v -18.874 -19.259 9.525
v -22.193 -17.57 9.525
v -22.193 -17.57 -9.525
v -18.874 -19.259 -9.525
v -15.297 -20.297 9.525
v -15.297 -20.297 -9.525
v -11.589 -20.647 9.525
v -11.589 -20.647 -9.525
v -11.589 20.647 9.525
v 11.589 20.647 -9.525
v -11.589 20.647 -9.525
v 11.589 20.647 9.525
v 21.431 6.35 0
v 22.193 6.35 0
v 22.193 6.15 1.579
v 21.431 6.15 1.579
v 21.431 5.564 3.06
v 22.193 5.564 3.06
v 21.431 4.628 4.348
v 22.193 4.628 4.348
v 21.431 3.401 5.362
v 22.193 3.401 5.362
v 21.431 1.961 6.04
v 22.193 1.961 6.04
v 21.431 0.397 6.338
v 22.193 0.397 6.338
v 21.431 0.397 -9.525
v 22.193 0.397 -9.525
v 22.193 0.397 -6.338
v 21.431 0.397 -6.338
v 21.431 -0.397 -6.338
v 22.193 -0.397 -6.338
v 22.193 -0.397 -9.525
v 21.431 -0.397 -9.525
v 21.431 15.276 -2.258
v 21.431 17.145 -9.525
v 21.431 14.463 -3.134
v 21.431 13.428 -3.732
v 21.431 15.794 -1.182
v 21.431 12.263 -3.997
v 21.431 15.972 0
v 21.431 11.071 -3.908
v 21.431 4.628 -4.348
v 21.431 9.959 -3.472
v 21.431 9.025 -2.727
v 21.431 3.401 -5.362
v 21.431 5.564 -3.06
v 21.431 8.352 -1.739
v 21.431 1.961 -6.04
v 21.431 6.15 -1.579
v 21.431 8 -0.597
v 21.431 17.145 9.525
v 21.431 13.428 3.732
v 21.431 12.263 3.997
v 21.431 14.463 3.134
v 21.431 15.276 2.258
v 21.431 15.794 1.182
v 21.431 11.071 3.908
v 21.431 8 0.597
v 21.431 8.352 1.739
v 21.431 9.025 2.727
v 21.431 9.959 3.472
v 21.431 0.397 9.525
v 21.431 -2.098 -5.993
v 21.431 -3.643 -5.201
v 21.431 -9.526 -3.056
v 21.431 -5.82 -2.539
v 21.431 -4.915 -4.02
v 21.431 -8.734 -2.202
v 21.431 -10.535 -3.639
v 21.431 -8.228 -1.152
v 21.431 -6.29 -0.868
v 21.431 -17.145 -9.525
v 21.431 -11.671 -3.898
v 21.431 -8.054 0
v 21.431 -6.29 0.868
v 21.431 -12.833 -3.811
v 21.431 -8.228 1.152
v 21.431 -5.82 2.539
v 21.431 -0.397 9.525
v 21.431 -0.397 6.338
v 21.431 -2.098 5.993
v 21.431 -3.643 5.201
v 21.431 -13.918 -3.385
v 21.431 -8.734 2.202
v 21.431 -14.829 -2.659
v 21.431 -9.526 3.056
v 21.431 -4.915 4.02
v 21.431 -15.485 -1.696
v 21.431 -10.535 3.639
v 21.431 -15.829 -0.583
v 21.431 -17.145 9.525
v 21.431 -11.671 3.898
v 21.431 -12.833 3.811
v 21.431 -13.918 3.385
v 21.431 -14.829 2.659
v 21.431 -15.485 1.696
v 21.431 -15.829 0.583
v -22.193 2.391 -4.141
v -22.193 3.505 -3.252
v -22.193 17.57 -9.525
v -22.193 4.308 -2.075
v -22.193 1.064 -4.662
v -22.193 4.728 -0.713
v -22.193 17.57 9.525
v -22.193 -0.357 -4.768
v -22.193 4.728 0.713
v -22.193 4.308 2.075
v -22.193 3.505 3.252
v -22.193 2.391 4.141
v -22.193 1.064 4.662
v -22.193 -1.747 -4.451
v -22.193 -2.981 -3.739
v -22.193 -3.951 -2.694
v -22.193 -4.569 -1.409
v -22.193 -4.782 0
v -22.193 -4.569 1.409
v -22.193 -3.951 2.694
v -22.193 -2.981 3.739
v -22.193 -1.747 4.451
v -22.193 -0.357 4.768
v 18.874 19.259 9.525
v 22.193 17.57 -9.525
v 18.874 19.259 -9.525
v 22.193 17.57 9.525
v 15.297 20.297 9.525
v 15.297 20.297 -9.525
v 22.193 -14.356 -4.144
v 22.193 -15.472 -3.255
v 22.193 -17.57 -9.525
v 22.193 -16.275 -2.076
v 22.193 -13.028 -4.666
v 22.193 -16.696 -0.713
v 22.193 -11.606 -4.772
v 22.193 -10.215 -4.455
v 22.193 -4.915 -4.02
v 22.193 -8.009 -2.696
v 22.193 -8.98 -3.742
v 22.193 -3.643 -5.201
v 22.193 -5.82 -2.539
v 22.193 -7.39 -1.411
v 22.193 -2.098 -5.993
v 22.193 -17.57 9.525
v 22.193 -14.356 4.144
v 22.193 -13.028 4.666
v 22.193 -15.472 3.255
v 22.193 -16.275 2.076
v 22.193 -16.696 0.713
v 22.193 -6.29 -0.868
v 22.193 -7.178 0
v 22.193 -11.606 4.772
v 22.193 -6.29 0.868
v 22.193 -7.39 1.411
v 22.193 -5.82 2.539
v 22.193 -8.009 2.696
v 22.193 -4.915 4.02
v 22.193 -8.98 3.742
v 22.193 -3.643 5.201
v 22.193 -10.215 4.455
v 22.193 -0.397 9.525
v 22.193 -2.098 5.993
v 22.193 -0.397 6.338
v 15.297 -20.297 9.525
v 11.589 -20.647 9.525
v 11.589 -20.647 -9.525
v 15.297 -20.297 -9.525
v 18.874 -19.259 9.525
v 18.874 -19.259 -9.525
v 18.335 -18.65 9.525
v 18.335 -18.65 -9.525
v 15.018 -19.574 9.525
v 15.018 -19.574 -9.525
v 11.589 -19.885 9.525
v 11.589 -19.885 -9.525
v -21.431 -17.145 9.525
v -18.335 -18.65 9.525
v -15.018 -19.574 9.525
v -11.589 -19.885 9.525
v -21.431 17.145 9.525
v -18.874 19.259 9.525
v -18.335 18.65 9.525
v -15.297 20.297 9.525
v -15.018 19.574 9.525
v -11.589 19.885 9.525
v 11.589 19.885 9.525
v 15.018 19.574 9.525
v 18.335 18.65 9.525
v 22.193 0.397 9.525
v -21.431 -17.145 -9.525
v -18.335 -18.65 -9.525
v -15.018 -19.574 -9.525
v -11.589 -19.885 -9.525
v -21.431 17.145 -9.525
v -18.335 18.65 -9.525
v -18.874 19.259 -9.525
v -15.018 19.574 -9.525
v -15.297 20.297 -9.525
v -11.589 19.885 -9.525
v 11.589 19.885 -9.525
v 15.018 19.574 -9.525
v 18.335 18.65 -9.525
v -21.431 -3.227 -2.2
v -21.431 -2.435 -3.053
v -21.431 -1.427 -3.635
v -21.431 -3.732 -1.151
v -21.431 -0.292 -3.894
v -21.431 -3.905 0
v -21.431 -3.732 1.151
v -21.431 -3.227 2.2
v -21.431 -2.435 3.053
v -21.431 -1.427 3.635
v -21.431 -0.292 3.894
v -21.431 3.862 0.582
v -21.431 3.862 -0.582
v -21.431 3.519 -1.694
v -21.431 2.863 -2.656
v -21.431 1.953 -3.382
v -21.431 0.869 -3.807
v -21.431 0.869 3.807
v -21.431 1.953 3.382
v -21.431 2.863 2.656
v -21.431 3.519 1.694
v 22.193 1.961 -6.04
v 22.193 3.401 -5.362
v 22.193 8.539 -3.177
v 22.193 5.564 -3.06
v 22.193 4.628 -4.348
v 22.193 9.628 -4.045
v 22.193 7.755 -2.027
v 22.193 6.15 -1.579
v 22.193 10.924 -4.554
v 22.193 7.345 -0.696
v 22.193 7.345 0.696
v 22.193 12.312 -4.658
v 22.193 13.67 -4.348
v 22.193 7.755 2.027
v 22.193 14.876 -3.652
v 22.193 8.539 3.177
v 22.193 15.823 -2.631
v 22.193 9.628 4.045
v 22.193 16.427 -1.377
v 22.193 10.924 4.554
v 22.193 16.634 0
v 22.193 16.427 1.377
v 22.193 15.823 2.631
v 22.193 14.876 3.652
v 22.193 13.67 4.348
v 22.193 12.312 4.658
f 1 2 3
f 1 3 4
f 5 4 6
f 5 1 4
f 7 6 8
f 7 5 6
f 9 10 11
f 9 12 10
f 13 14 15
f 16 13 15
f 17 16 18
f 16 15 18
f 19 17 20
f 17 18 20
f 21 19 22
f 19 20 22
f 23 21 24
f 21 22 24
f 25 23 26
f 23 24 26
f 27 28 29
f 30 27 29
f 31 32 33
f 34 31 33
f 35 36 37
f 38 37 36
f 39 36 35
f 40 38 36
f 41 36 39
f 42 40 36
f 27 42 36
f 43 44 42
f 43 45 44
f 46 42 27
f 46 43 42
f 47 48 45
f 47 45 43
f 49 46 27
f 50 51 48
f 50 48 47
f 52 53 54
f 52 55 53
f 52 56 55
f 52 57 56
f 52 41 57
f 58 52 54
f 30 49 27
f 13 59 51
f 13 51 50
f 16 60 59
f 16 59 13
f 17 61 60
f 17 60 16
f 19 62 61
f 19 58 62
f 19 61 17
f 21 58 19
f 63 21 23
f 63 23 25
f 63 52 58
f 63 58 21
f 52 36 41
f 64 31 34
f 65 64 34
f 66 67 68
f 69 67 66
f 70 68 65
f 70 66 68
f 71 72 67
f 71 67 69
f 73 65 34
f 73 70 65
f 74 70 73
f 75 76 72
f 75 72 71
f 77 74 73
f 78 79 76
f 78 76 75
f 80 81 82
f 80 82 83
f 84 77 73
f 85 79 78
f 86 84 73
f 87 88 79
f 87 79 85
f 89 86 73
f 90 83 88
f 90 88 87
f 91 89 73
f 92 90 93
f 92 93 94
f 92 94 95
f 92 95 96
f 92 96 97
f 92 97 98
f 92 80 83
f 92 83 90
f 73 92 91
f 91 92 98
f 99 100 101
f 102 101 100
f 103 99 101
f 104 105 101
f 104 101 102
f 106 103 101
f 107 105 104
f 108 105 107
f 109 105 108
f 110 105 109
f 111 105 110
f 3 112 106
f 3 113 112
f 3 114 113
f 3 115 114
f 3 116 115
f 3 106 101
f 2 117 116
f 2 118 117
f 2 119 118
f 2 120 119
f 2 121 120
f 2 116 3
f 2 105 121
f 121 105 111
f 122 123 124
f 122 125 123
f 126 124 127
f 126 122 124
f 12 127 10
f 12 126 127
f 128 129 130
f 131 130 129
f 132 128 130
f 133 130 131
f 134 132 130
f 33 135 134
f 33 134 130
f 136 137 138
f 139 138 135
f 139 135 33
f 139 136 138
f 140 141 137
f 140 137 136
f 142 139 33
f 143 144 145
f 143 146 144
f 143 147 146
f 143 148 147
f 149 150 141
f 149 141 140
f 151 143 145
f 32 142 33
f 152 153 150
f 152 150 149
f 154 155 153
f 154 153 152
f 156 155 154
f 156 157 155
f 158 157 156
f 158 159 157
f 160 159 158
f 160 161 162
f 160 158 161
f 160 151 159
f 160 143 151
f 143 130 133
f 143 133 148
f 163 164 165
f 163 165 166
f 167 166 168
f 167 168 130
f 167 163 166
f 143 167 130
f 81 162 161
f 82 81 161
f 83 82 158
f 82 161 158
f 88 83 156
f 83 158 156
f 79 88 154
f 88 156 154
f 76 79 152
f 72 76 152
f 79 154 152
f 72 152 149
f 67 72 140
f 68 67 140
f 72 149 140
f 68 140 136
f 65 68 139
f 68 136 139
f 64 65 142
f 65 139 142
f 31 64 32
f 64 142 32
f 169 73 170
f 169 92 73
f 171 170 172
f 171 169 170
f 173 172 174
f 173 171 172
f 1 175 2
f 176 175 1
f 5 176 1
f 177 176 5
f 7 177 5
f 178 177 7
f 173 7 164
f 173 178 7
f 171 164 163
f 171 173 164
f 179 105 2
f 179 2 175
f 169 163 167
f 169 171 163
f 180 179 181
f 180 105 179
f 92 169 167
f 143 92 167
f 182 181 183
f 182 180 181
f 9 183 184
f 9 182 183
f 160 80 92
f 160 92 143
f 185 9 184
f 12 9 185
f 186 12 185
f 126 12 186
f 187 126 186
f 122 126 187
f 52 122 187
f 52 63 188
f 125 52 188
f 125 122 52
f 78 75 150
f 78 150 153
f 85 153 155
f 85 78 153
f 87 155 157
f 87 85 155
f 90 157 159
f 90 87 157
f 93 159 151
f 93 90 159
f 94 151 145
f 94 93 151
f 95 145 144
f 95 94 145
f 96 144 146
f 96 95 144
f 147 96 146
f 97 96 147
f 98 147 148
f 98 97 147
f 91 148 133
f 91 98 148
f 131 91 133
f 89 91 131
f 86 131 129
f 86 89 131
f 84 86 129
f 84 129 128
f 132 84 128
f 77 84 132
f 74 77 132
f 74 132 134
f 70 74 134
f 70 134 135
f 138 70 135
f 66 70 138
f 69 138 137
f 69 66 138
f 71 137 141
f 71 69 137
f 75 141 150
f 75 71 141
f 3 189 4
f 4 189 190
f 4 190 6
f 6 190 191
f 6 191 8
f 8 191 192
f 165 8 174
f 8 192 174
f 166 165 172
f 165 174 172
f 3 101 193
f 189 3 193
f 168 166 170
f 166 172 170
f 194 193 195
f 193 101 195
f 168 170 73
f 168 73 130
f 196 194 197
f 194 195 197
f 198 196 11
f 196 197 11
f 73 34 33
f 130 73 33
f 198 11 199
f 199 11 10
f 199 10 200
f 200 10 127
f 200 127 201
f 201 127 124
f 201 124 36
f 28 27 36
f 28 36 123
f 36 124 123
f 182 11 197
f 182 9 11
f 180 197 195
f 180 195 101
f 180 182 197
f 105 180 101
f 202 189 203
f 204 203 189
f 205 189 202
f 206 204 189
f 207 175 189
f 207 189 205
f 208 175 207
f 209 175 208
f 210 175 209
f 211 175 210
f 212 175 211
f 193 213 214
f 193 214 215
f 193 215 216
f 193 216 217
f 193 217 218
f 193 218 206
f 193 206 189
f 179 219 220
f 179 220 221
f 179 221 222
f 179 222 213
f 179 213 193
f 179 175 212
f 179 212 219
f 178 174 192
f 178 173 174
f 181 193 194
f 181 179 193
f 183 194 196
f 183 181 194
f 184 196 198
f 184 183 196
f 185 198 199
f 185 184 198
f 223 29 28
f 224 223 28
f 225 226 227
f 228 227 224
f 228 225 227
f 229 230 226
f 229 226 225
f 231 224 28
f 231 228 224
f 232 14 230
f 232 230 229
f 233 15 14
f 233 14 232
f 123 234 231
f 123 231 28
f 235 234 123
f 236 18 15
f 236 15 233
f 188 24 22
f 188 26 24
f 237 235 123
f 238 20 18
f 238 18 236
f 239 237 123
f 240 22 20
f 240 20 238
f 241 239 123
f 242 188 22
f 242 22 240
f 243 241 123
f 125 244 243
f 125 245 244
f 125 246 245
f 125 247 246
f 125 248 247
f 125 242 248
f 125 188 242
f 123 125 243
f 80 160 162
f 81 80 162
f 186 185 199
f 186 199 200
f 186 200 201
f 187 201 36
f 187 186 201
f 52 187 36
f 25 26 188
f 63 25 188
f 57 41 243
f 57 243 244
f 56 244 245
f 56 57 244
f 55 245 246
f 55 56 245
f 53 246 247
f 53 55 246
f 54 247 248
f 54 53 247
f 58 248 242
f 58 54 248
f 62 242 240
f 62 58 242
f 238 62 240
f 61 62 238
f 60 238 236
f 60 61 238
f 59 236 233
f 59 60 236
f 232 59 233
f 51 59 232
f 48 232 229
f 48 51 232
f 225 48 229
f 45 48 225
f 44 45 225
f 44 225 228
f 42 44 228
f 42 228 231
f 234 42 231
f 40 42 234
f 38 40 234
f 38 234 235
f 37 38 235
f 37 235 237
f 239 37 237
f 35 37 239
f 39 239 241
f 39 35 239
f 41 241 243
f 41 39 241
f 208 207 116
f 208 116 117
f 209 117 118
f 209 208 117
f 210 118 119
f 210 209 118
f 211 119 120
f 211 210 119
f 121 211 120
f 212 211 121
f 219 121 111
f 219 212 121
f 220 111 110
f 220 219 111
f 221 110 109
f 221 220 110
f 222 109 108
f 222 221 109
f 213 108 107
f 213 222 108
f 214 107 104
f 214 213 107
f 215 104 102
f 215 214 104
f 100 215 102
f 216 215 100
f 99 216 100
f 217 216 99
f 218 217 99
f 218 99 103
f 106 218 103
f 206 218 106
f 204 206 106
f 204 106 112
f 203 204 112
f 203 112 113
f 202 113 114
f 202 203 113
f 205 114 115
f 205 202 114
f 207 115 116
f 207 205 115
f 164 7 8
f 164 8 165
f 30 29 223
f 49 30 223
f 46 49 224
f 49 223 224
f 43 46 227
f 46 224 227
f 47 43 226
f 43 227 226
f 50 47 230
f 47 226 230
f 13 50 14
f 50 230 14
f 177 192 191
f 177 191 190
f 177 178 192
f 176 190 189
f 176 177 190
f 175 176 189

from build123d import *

# Parameters (mm, degrees)
F1_DEPTH = 9.525
F2_R     = 3.90906
F3_DEPTH = 25.4
F4_DEPTH = 25.4
F5_R     = 3.90525
F6_DEPTH = 25.4


# Not quite as in the source:
# - a fillet or chamfer that OpenCascade refuses, or shapes differently, is made with other operations: its cross-section is extruded or revolved along the edge and cut away or added


with BuildPart() as f1:
    # F0 (on Top) → F1 (new body, symmetric)
    with BuildSketch(Plane.XY):
        with BuildLine():
            Line((0, 20.6466445854), (-11.58875, 20.6466445854))
            ThreePointArc((-11.58875, 20.6466445854), (-17.1096965819, 19.861848606), (-22.19325, 17.5696355848))
            Line((-22.19325, 17.5696355848), (-22.19325, -17.5696355848))
            ThreePointArc((-22.19325, -17.5696355848), (-17.1096965819, -19.861848606), (-11.58875, -20.6466445854))
            Line((-11.58875, -20.6466445854), (0, -20.6466445854))
            Line((0, -20.6466445854), (11.58875, -20.6466445854))
            ThreePointArc((11.58875, -20.6466445854), (17.1096965819, -19.861848606), (22.19325, -17.5696355848))
            Line((22.19325, -17.5696355848), (22.19325, 17.5696355848))
            ThreePointArc((22.19325, 17.5696355848), (17.1096965819, 19.861848606), (11.58875, 20.6466445854))
            Line((11.58875, 20.6466445854), (0, 20.6466445854))
        make_face()
        with BuildLine():
            ThreePointArc((11.58875, 19.8846445854), (16.6970877606, 19.1869573913), (21.43125, 17.145))
            Line((21.43125, 17.145), (21.43125, -17.145))
            ThreePointArc((21.43125, -17.145), (16.6970877606, -19.1869573913), (11.58875, -19.8846445854))
            Line((11.58875, -19.8846445854), (0, -19.8846445854))
            Line((0, -19.8846445854), (-11.58875, -19.8846445854))
            ThreePointArc((-11.58875, -19.8846445854), (-16.6970877606, -19.1869573913), (-21.43125, -17.145))
            Line((-21.43125, -17.145), (-21.43125, 17.145))
            ThreePointArc((-21.43125, 17.145), (-16.6970877606, 19.1869573913), (-11.58875, 19.8846445854))
            Line((-11.58875, 19.8846445854), (0, 19.8846445854))
            Line((0, 19.8846445854), (11.58875, 19.8846445854))
        make_face(mode=Mode.SUBTRACT)
    extrude(amount=F1_DEPTH, both=True)

    # F2 (on face) → F3 (cut)
    with BuildSketch(Plane.YZ.offset(22.19325)):
        with BuildLine():
            ThreePointArc((0.396875, -6.3375855209), (4.6283180665, -4.3475478002), (6.35, 0))
            ThreePointArc((6.35, 0), (4.6283180665, 4.3475478002), (0.396875, 6.3375855209))
            Line((0.396875, 6.3375855209), (0.396875, -6.3375855209))
        make_face()
        with BuildLine():
            Line((0.396875, -6.3375855209), (0.396875, 6.3375855209))
            ThreePointArc((0.396875, 6.3375855209), (0, 6.35), (-0.396875, 6.3375855209))
            Line((-0.396875, 6.3375855209), (-0.396875, -6.3375855209))
            ThreePointArc((-0.396875, -6.3375855209), (0, -6.35), (0.396875, -6.3375855209))
        make_face()
        with BuildLine():
            ThreePointArc((-0.396875, 6.3375855209), (0, 6.35), (0.396875, 6.3375855209))
            Line((0.396875, 6.3375855209), (0.396875, 16.235569492))
            Line((0.396875, 16.235569492), (-0.396875, 16.235569492))
            Line((-0.396875, 16.235569492), (-0.396875, 6.3375855209))
        make_face()
        with BuildLine():
            Line((0.396875, -16.235569492), (0.396875, -6.3375855209))
            ThreePointArc((0.396875, -6.3375855209), (0, -6.35), (-0.396875, -6.3375855209))
            Line((-0.396875, -6.3375855209), (-0.396875, -16.235569492))
            Line((-0.396875, -16.235569492), (0.396875, -16.235569492))
        make_face()
        with BuildLine():
            Line((-0.396875, -6.3375855209), (-0.396875, 6.3375855209))
            ThreePointArc((-0.396875, 6.3375855209), (-6.35, 0), (-0.396875, -6.3375855209))
        make_face()
        with Locations((-11.9634, 0)):
            Circle(F2_R)
        with Locations((11.9634, 0)):
            Circle(F2_R)
    extrude(amount=-F3_DEPTH, mode=Mode.SUBTRACT)

    # F2 (on face) → F4 (cut)
    with BuildSketch(Plane.YZ.offset(22.19325)):
        with BuildLine():
            ThreePointArc((0.396875, -6.3375855209), (4.6283180665, -4.3475478002), (6.35, 0))
            ThreePointArc((6.35, 0), (4.6283180665, 4.3475478002), (0.396875, 6.3375855209))
            Line((0.396875, 6.3375855209), (0.396875, -6.3375855209))
        make_face()
        with BuildLine():
            Line((0.396875, -6.3375855209), (0.396875, 6.3375855209))
            ThreePointArc((0.396875, 6.3375855209), (0, 6.35), (-0.396875, 6.3375855209))
            Line((-0.396875, 6.3375855209), (-0.396875, -6.3375855209))
            ThreePointArc((-0.396875, -6.3375855209), (0, -6.35), (0.396875, -6.3375855209))
        make_face()
        with BuildLine():
            ThreePointArc((-0.396875, 6.3375855209), (0, 6.35), (0.396875, 6.3375855209))
            Line((0.396875, 6.3375855209), (0.396875, 16.235569492))
            Line((0.396875, 16.235569492), (-0.396875, 16.235569492))
            Line((-0.396875, 16.235569492), (-0.396875, 6.3375855209))
        make_face()
        with BuildLine():
            Line((0.396875, -16.235569492), (0.396875, -6.3375855209))
            ThreePointArc((0.396875, -6.3375855209), (0, -6.35), (-0.396875, -6.3375855209))
            Line((-0.396875, -6.3375855209), (-0.396875, -16.235569492))
            Line((-0.396875, -16.235569492), (0.396875, -16.235569492))
        make_face()
        with BuildLine():
            Line((-0.396875, -6.3375855209), (-0.396875, 6.3375855209))
            ThreePointArc((-0.396875, 6.3375855209), (-6.35, 0), (-0.396875, -6.3375855209))
        make_face()
        with Locations((-11.9634, 0)):
            Circle(F2_R)
        with Locations((11.9634, 0)):
            Circle(F2_R)
    extrude(amount=-F4_DEPTH, mode=Mode.SUBTRACT)

    # F5 (on face) → F6 (cut)
    with BuildSketch(Plane(origin=(-22.19325, 0, 0), x_dir=(0, -1, 0), z_dir=(-1, 0, 0))):
        Circle(F5_R)
    extrude(amount=-F6_DEPTH, mode=Mode.SUBTRACT)

    # F7: chamfer of 0.762 x 0.8765807263 on 3 edges, made by hand

    # F7_s1 → F7_t2 (revolve, cut)
    with BuildSketch(Plane.XY):
        Polygon((22.19325, -7.1777592737), (21.43125, -8.05434), (22.19325, -8.05434), align=None)
    revolve(axis=Axis((22.19325, -11.9634, 0), (1, 0, 0)), mode=Mode.SUBTRACT)

    # F7_s3 → F7_t4 (revolve, cut)
    with BuildSketch(Plane.XY):
        Polygon((22.19325, 16.63446), (21.3166692737, 15.87246), (22.19325, 15.87246), align=None)
    revolve(axis=Axis((22.19325, 11.9634, 0), (1, 0, 0)), mode=Mode.SUBTRACT)

    # F7_s5 → F7_t6 (revolve, cut)
    with BuildSketch(Plane.XY):
        Polygon((-22.19325, -4.7818307263), (-21.43125, -3.90525), (-22.19325, -3.90525), align=None)
    revolve(axis=Axis((-22.19325, 0, 0), (-1, 0, 0)), mode=Mode.SUBTRACT)


solid = f1.part
